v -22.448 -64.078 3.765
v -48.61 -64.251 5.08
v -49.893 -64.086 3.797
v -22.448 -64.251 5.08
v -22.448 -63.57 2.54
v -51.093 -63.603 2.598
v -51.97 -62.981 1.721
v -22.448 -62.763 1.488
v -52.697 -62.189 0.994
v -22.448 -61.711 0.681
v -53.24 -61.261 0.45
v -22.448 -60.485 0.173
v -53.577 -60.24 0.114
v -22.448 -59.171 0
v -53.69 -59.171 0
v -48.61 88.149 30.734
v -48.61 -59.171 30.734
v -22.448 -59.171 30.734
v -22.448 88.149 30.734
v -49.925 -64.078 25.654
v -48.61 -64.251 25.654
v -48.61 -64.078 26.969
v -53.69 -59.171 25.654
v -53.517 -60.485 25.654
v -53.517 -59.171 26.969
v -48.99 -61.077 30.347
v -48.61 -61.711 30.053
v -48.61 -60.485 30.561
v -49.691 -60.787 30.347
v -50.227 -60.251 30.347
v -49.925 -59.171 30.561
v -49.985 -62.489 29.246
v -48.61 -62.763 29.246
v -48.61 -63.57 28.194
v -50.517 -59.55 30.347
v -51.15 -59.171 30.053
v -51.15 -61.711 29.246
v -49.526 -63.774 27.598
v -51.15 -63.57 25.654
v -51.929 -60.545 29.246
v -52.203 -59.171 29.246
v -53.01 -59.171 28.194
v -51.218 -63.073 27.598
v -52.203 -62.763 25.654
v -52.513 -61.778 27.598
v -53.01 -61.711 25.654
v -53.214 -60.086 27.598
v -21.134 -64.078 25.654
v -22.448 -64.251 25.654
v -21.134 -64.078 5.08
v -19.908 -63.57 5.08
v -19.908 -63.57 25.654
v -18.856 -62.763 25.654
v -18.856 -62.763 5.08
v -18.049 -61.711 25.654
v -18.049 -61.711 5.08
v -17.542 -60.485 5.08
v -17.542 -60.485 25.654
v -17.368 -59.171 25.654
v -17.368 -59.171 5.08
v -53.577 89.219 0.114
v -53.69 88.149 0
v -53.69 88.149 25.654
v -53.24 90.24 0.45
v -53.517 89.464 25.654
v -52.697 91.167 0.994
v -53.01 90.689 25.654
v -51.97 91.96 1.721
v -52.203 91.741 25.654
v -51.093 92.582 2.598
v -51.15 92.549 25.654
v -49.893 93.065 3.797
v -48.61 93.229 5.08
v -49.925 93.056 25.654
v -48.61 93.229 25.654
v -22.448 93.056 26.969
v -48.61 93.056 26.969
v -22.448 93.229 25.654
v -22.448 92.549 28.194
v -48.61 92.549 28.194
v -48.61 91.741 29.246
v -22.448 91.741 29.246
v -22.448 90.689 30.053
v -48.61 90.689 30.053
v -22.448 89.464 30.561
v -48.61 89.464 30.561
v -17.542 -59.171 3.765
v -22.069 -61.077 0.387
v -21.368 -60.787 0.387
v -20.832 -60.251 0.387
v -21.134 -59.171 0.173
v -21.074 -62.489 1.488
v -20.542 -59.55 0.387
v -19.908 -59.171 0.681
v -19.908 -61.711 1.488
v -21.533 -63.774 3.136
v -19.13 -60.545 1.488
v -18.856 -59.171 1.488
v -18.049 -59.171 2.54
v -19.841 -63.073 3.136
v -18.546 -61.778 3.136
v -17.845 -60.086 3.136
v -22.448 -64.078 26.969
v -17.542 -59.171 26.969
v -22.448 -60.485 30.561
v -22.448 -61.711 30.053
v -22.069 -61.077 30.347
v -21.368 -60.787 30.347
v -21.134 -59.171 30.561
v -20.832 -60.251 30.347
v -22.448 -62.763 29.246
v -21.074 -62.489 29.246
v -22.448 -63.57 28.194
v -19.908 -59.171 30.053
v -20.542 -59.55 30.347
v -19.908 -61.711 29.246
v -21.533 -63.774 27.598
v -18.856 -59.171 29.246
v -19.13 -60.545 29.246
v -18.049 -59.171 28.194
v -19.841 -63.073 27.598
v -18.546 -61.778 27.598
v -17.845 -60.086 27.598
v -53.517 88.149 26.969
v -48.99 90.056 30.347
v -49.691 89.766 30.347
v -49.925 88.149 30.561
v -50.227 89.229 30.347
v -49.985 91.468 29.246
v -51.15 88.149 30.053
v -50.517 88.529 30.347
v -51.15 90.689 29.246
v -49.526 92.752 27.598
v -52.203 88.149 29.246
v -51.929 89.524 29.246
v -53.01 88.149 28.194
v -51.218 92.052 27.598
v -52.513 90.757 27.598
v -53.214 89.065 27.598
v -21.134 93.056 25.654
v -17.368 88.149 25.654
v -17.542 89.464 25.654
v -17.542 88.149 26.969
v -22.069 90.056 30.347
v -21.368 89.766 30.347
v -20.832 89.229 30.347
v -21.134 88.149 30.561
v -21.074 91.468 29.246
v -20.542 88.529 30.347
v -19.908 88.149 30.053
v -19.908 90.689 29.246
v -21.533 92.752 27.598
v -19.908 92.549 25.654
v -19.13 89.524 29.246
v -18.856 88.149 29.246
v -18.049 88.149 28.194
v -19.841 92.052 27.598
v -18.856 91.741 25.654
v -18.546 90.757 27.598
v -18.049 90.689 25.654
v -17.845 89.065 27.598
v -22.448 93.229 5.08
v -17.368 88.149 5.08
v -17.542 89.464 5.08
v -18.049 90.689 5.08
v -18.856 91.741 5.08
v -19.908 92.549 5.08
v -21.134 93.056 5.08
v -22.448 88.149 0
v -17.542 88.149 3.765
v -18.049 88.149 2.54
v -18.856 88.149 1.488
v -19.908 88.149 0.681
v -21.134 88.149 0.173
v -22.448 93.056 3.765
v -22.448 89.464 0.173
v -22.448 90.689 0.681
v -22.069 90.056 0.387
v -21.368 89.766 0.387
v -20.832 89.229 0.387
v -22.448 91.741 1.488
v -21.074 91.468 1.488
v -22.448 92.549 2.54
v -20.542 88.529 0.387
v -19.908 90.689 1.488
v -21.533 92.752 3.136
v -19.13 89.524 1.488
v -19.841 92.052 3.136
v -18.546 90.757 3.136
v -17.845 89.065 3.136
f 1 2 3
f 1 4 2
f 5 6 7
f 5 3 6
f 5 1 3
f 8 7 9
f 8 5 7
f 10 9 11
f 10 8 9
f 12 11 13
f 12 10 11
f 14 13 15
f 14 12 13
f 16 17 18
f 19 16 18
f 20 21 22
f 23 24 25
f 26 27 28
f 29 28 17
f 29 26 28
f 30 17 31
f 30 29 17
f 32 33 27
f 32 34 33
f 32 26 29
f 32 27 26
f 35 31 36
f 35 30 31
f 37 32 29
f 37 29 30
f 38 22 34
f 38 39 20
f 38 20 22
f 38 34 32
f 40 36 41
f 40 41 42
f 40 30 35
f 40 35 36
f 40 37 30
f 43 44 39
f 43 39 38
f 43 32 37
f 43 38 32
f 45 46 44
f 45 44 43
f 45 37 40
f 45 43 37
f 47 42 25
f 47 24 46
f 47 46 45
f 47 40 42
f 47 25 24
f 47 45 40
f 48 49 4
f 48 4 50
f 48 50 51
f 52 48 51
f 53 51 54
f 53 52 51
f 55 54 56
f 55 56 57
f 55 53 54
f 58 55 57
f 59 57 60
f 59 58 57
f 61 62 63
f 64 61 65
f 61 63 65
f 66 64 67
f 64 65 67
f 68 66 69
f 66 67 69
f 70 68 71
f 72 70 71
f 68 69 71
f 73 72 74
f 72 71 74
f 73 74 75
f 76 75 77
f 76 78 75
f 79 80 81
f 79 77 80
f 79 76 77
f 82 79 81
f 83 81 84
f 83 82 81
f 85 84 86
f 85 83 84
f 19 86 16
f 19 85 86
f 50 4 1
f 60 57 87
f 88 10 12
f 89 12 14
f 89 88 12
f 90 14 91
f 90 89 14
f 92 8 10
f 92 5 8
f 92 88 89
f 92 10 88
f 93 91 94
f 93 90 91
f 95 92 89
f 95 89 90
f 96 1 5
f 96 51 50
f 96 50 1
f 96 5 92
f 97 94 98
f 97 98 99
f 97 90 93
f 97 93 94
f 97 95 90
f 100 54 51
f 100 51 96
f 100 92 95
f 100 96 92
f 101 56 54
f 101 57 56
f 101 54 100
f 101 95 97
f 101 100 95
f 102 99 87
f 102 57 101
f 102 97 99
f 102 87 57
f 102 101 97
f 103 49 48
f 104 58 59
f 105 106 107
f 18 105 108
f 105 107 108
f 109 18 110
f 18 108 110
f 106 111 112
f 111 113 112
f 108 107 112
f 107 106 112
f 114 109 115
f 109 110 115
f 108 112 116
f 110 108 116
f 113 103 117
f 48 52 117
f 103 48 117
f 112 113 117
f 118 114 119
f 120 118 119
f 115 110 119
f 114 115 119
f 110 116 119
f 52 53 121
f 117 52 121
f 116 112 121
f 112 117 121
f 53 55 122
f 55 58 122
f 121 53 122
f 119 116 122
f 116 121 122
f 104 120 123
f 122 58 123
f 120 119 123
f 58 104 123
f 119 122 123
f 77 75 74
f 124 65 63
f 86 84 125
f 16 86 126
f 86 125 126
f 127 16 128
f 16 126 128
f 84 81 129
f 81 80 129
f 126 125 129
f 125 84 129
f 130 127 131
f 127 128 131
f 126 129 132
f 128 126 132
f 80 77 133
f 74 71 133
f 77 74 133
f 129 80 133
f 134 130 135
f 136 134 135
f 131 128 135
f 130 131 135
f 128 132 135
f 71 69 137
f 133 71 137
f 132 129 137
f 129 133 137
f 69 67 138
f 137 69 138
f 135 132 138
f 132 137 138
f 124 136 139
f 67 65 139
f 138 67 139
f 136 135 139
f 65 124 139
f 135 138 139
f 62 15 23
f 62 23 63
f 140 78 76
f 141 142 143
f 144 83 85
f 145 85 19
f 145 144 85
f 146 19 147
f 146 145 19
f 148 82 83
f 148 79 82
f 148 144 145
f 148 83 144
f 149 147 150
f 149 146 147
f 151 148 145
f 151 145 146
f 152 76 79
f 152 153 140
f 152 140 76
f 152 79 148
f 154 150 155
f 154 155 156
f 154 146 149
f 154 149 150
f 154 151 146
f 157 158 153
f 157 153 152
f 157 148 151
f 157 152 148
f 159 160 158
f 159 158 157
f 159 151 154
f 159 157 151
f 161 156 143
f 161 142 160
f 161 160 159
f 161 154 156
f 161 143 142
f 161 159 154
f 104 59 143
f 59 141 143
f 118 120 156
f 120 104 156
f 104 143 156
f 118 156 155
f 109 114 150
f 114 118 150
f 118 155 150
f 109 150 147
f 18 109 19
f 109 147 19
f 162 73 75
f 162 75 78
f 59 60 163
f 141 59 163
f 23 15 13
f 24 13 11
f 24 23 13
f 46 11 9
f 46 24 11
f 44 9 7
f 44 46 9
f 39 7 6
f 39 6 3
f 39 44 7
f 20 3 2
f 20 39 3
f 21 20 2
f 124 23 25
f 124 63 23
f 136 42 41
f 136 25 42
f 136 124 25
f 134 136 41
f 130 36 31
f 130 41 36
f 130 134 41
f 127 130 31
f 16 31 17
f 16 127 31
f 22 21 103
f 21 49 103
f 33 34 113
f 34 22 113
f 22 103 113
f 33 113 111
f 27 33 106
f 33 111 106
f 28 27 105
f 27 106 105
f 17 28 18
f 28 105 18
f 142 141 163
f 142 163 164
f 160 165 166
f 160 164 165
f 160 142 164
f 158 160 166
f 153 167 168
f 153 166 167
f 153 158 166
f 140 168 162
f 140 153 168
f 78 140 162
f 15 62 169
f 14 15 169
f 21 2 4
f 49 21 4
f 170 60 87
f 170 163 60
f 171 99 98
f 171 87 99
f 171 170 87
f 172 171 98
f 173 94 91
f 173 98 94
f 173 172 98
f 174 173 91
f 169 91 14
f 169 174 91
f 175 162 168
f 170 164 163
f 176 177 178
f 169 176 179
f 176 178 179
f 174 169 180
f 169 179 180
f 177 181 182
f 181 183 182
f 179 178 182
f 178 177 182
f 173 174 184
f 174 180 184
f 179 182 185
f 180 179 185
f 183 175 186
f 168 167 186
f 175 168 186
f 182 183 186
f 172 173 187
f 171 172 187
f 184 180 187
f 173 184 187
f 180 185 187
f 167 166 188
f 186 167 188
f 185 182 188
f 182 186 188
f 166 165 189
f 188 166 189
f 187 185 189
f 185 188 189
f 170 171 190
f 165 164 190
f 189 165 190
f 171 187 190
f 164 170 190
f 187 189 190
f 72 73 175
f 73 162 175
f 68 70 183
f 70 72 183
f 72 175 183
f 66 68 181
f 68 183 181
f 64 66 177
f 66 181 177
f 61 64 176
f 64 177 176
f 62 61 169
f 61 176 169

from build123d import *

# Parameters (mm, degrees)
F0_W     = 36.322
F0_H     = 157.48
F1_DEPTH = 30.734
F2_R     = 5.08


with BuildPart() as f1:
    # F0 (on Top) → F1 (new body)
    with BuildSketch(Plane.XY):
        with Locations((-35.529498, 14.489323)):
            Rectangle(F0_W, F0_H)
    extrude(amount=F1_DEPTH)

    # F2
    f2_edges = [f1.edges().sort_by_distance(p)[0] for p in [
        (-53.690498, -64.250677, 15.367),
        (-17.368498, -64.250677, 15.367),
        (-35.529498, -64.250677, 0),
        (-35.529498, -64.250677, 30.734),
        (-17.368498, 93.229323, 15.367),
        (-53.690498, 93.229323, 15.367),
        (-35.529498, 93.229323, 30.734),
        (-35.529498, 93.229323, 0),
        (-53.690498, 14.489323, 30.734),
        (-17.368498, 14.489323, 30.734),
        (-17.368498, 14.489323, 0),
    ]]
    fillet(f2_edges, radius=F2_R)


solid = f1.part
